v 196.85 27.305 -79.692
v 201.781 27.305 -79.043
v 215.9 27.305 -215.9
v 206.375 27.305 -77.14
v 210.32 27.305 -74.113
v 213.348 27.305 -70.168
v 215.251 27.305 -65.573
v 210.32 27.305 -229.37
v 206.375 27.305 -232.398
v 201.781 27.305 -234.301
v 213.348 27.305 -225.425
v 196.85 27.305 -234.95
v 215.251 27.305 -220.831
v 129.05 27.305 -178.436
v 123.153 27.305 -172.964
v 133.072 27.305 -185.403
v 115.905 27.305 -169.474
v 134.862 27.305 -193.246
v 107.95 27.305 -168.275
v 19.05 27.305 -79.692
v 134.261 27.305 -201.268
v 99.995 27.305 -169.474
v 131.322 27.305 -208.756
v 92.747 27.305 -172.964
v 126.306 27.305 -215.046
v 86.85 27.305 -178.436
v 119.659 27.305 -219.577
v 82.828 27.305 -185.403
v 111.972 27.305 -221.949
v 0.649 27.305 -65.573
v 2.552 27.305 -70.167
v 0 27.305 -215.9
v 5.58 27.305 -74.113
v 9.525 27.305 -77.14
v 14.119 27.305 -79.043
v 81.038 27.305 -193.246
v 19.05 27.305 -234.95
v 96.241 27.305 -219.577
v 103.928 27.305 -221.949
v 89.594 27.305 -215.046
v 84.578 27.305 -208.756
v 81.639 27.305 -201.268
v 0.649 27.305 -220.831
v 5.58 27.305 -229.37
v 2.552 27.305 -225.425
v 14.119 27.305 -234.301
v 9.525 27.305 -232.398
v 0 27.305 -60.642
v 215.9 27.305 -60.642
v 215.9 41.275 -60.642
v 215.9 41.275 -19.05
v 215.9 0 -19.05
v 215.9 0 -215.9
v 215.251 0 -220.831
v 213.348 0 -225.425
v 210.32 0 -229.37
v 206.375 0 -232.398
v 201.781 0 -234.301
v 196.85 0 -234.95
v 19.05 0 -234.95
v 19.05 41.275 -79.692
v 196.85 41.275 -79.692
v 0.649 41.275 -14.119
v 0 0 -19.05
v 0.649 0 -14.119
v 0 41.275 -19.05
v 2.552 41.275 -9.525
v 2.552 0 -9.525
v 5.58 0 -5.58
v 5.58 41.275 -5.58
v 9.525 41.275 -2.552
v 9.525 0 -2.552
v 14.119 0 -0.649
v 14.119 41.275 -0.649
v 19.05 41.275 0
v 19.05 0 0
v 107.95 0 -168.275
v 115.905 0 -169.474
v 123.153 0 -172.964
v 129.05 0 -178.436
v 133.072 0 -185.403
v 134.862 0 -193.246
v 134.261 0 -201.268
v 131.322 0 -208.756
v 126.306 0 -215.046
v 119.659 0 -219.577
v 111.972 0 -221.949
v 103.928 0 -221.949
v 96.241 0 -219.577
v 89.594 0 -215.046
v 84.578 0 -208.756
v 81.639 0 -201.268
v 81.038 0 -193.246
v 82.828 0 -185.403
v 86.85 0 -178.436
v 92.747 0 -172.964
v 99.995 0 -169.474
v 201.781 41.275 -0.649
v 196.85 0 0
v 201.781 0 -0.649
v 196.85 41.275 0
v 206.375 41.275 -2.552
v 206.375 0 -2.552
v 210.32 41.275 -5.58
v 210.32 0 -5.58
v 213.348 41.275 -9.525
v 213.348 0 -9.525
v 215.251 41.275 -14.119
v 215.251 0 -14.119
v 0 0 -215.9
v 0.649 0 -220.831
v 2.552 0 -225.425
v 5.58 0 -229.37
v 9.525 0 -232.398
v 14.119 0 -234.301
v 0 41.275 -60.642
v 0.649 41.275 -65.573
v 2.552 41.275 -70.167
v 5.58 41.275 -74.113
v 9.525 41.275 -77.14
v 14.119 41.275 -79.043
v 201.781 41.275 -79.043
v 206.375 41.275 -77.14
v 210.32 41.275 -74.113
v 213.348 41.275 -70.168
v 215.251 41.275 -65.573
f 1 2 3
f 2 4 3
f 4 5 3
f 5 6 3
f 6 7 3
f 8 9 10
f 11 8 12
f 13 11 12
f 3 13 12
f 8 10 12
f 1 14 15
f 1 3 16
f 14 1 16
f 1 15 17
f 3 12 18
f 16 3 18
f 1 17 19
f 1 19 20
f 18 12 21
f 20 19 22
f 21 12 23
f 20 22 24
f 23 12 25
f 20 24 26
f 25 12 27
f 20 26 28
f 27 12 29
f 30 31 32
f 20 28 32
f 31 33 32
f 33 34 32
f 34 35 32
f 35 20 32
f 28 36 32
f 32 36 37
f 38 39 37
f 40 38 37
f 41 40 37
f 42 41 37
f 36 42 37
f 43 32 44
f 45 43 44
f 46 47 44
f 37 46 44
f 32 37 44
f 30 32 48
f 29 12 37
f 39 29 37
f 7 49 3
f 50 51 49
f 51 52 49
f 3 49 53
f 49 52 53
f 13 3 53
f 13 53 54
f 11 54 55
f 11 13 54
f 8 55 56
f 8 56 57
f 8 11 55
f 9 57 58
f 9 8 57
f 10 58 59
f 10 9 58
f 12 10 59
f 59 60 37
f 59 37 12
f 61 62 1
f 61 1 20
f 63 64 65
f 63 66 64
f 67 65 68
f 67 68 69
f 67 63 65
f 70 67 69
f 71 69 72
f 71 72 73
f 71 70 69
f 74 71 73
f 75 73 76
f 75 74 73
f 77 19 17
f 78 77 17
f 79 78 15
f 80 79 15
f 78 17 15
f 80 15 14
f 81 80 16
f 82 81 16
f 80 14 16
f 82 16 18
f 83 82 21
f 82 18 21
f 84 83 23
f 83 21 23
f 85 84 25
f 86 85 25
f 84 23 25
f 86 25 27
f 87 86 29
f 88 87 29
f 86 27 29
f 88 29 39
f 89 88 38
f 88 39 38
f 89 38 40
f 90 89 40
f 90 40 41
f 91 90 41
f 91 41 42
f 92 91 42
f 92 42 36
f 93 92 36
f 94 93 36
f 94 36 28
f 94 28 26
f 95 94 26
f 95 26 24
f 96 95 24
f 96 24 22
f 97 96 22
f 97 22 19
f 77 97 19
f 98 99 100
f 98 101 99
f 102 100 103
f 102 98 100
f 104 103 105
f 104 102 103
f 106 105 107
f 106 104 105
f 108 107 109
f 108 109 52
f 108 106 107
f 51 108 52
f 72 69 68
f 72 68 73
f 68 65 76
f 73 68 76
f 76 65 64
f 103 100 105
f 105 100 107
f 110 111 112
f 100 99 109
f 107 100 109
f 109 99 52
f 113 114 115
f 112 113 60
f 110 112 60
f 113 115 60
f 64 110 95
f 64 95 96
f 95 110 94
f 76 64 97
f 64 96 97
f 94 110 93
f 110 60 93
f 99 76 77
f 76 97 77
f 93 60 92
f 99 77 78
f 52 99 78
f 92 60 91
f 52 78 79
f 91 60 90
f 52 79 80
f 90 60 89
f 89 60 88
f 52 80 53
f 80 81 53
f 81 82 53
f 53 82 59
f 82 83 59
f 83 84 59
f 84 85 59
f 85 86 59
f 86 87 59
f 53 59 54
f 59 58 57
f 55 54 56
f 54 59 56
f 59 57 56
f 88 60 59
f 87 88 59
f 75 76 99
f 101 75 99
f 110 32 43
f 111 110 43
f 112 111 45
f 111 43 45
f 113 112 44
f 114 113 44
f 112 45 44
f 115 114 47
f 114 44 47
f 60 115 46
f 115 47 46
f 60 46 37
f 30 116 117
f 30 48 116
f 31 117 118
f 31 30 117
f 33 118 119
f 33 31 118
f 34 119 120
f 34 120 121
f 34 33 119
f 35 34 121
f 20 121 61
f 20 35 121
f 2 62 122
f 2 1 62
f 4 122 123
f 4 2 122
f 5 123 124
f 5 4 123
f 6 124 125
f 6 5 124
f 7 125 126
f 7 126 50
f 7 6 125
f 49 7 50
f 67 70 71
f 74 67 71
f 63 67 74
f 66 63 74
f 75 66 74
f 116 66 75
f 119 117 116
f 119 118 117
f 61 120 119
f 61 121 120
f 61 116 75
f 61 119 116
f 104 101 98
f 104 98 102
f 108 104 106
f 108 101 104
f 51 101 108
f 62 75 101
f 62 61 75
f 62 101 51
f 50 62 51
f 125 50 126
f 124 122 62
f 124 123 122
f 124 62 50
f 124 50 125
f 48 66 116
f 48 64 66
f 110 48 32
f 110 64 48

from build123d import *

# Parameters (mm, degrees)
SKETCH1_W           = 215.9
SKETCH1_H           = 234.95
BOSS_EXTRUDE1_DEPTH = 41.275
FILLET1_R           = 19.05
CUT_EXTRUDE1_REACH  = 323.742
SKETCH3_R           = 26.9875
CUT_EXTRUDE2_DEPTH  = 13.97
FILLET2_R           = 19.05


with BuildPart() as part:
    # Sketch1 → Boss-Extrude1 (new body)
    with BuildSketch(Plane(origin=(0, 0, 0), x_dir=(1, 0, 0), z_dir=(0, 1, 0))):
        with Locations((107.95, 117.475)):
            Rectangle(SKETCH1_W, SKETCH1_H)
    extrude(amount=BOSS_EXTRUDE1_DEPTH)

    # Fillet1
    fillet1_edges = [part.edges().sort_by_distance(p)[0] for p in [
        (0, 20.6375, -234.95),
        (215.9, 20.6375, -234.95),
        (215.9, 20.6375, 0),
        (0, 20.6375, 0),
    ]]
    fillet(fillet1_edges, radius=FILLET1_R)

    # Sketch3 → Cut-Extrude1 (cut, up to next)
    with BuildSketch(Plane(origin=(0, 41.275, 0), x_dir=(1, 0, 0), z_dir=(0, 1, 0)), mode=Mode.PRIVATE) as cut_extrude1_sk1:
        with Locations(Location((107.95, 195.2625, 0), (0, 0, 270))):
            Circle(SKETCH3_R)
    cut_extrude1_tool1 = extrude(cut_extrude1_sk1.sketch, amount=-CUT_EXTRUDE1_REACH, mode=Mode.PRIVATE) & part.part
    add(cut_extrude1_tool1.solids().sort_by_distance((107.95, 41.275, -195.2625))[0], mode=Mode.SUBTRACT)

    # Sketch4 → Cut-Extrude2 (cut)
    with BuildSketch(Plane(origin=(0, 41.275, 0), x_dir=(1, 0, 0), z_dir=(0, 1, 0))):
        with BuildLine():
            Line((215.9, 79.6925), (0, 79.6925))
            Line((0, 79.6925), (0, 215.9))
            ThreePointArc((0, 215.9), (5.579615818, 229.370384182), (19.05, 234.95))
            Line((19.05, 234.95), (196.85, 234.95))
            ThreePointArc((196.85, 234.95), (210.320384182, 229.370384182), (215.9, 215.9))
            Line((215.9, 215.9), (215.9, 79.6925))
        make_face()
    extrude(amount=-CUT_EXTRUDE2_DEPTH, mode=Mode.SUBTRACT)

    # Fillet2
    fillet2_edges = [part.edges().sort_by_distance(p)[0] for p in [
        (215.9, 34.29, -79.6925),
        (0, 34.29, -79.6925),
    ]]
    fillet(fillet2_edges, radius=FILLET2_R)


solid = part.part
